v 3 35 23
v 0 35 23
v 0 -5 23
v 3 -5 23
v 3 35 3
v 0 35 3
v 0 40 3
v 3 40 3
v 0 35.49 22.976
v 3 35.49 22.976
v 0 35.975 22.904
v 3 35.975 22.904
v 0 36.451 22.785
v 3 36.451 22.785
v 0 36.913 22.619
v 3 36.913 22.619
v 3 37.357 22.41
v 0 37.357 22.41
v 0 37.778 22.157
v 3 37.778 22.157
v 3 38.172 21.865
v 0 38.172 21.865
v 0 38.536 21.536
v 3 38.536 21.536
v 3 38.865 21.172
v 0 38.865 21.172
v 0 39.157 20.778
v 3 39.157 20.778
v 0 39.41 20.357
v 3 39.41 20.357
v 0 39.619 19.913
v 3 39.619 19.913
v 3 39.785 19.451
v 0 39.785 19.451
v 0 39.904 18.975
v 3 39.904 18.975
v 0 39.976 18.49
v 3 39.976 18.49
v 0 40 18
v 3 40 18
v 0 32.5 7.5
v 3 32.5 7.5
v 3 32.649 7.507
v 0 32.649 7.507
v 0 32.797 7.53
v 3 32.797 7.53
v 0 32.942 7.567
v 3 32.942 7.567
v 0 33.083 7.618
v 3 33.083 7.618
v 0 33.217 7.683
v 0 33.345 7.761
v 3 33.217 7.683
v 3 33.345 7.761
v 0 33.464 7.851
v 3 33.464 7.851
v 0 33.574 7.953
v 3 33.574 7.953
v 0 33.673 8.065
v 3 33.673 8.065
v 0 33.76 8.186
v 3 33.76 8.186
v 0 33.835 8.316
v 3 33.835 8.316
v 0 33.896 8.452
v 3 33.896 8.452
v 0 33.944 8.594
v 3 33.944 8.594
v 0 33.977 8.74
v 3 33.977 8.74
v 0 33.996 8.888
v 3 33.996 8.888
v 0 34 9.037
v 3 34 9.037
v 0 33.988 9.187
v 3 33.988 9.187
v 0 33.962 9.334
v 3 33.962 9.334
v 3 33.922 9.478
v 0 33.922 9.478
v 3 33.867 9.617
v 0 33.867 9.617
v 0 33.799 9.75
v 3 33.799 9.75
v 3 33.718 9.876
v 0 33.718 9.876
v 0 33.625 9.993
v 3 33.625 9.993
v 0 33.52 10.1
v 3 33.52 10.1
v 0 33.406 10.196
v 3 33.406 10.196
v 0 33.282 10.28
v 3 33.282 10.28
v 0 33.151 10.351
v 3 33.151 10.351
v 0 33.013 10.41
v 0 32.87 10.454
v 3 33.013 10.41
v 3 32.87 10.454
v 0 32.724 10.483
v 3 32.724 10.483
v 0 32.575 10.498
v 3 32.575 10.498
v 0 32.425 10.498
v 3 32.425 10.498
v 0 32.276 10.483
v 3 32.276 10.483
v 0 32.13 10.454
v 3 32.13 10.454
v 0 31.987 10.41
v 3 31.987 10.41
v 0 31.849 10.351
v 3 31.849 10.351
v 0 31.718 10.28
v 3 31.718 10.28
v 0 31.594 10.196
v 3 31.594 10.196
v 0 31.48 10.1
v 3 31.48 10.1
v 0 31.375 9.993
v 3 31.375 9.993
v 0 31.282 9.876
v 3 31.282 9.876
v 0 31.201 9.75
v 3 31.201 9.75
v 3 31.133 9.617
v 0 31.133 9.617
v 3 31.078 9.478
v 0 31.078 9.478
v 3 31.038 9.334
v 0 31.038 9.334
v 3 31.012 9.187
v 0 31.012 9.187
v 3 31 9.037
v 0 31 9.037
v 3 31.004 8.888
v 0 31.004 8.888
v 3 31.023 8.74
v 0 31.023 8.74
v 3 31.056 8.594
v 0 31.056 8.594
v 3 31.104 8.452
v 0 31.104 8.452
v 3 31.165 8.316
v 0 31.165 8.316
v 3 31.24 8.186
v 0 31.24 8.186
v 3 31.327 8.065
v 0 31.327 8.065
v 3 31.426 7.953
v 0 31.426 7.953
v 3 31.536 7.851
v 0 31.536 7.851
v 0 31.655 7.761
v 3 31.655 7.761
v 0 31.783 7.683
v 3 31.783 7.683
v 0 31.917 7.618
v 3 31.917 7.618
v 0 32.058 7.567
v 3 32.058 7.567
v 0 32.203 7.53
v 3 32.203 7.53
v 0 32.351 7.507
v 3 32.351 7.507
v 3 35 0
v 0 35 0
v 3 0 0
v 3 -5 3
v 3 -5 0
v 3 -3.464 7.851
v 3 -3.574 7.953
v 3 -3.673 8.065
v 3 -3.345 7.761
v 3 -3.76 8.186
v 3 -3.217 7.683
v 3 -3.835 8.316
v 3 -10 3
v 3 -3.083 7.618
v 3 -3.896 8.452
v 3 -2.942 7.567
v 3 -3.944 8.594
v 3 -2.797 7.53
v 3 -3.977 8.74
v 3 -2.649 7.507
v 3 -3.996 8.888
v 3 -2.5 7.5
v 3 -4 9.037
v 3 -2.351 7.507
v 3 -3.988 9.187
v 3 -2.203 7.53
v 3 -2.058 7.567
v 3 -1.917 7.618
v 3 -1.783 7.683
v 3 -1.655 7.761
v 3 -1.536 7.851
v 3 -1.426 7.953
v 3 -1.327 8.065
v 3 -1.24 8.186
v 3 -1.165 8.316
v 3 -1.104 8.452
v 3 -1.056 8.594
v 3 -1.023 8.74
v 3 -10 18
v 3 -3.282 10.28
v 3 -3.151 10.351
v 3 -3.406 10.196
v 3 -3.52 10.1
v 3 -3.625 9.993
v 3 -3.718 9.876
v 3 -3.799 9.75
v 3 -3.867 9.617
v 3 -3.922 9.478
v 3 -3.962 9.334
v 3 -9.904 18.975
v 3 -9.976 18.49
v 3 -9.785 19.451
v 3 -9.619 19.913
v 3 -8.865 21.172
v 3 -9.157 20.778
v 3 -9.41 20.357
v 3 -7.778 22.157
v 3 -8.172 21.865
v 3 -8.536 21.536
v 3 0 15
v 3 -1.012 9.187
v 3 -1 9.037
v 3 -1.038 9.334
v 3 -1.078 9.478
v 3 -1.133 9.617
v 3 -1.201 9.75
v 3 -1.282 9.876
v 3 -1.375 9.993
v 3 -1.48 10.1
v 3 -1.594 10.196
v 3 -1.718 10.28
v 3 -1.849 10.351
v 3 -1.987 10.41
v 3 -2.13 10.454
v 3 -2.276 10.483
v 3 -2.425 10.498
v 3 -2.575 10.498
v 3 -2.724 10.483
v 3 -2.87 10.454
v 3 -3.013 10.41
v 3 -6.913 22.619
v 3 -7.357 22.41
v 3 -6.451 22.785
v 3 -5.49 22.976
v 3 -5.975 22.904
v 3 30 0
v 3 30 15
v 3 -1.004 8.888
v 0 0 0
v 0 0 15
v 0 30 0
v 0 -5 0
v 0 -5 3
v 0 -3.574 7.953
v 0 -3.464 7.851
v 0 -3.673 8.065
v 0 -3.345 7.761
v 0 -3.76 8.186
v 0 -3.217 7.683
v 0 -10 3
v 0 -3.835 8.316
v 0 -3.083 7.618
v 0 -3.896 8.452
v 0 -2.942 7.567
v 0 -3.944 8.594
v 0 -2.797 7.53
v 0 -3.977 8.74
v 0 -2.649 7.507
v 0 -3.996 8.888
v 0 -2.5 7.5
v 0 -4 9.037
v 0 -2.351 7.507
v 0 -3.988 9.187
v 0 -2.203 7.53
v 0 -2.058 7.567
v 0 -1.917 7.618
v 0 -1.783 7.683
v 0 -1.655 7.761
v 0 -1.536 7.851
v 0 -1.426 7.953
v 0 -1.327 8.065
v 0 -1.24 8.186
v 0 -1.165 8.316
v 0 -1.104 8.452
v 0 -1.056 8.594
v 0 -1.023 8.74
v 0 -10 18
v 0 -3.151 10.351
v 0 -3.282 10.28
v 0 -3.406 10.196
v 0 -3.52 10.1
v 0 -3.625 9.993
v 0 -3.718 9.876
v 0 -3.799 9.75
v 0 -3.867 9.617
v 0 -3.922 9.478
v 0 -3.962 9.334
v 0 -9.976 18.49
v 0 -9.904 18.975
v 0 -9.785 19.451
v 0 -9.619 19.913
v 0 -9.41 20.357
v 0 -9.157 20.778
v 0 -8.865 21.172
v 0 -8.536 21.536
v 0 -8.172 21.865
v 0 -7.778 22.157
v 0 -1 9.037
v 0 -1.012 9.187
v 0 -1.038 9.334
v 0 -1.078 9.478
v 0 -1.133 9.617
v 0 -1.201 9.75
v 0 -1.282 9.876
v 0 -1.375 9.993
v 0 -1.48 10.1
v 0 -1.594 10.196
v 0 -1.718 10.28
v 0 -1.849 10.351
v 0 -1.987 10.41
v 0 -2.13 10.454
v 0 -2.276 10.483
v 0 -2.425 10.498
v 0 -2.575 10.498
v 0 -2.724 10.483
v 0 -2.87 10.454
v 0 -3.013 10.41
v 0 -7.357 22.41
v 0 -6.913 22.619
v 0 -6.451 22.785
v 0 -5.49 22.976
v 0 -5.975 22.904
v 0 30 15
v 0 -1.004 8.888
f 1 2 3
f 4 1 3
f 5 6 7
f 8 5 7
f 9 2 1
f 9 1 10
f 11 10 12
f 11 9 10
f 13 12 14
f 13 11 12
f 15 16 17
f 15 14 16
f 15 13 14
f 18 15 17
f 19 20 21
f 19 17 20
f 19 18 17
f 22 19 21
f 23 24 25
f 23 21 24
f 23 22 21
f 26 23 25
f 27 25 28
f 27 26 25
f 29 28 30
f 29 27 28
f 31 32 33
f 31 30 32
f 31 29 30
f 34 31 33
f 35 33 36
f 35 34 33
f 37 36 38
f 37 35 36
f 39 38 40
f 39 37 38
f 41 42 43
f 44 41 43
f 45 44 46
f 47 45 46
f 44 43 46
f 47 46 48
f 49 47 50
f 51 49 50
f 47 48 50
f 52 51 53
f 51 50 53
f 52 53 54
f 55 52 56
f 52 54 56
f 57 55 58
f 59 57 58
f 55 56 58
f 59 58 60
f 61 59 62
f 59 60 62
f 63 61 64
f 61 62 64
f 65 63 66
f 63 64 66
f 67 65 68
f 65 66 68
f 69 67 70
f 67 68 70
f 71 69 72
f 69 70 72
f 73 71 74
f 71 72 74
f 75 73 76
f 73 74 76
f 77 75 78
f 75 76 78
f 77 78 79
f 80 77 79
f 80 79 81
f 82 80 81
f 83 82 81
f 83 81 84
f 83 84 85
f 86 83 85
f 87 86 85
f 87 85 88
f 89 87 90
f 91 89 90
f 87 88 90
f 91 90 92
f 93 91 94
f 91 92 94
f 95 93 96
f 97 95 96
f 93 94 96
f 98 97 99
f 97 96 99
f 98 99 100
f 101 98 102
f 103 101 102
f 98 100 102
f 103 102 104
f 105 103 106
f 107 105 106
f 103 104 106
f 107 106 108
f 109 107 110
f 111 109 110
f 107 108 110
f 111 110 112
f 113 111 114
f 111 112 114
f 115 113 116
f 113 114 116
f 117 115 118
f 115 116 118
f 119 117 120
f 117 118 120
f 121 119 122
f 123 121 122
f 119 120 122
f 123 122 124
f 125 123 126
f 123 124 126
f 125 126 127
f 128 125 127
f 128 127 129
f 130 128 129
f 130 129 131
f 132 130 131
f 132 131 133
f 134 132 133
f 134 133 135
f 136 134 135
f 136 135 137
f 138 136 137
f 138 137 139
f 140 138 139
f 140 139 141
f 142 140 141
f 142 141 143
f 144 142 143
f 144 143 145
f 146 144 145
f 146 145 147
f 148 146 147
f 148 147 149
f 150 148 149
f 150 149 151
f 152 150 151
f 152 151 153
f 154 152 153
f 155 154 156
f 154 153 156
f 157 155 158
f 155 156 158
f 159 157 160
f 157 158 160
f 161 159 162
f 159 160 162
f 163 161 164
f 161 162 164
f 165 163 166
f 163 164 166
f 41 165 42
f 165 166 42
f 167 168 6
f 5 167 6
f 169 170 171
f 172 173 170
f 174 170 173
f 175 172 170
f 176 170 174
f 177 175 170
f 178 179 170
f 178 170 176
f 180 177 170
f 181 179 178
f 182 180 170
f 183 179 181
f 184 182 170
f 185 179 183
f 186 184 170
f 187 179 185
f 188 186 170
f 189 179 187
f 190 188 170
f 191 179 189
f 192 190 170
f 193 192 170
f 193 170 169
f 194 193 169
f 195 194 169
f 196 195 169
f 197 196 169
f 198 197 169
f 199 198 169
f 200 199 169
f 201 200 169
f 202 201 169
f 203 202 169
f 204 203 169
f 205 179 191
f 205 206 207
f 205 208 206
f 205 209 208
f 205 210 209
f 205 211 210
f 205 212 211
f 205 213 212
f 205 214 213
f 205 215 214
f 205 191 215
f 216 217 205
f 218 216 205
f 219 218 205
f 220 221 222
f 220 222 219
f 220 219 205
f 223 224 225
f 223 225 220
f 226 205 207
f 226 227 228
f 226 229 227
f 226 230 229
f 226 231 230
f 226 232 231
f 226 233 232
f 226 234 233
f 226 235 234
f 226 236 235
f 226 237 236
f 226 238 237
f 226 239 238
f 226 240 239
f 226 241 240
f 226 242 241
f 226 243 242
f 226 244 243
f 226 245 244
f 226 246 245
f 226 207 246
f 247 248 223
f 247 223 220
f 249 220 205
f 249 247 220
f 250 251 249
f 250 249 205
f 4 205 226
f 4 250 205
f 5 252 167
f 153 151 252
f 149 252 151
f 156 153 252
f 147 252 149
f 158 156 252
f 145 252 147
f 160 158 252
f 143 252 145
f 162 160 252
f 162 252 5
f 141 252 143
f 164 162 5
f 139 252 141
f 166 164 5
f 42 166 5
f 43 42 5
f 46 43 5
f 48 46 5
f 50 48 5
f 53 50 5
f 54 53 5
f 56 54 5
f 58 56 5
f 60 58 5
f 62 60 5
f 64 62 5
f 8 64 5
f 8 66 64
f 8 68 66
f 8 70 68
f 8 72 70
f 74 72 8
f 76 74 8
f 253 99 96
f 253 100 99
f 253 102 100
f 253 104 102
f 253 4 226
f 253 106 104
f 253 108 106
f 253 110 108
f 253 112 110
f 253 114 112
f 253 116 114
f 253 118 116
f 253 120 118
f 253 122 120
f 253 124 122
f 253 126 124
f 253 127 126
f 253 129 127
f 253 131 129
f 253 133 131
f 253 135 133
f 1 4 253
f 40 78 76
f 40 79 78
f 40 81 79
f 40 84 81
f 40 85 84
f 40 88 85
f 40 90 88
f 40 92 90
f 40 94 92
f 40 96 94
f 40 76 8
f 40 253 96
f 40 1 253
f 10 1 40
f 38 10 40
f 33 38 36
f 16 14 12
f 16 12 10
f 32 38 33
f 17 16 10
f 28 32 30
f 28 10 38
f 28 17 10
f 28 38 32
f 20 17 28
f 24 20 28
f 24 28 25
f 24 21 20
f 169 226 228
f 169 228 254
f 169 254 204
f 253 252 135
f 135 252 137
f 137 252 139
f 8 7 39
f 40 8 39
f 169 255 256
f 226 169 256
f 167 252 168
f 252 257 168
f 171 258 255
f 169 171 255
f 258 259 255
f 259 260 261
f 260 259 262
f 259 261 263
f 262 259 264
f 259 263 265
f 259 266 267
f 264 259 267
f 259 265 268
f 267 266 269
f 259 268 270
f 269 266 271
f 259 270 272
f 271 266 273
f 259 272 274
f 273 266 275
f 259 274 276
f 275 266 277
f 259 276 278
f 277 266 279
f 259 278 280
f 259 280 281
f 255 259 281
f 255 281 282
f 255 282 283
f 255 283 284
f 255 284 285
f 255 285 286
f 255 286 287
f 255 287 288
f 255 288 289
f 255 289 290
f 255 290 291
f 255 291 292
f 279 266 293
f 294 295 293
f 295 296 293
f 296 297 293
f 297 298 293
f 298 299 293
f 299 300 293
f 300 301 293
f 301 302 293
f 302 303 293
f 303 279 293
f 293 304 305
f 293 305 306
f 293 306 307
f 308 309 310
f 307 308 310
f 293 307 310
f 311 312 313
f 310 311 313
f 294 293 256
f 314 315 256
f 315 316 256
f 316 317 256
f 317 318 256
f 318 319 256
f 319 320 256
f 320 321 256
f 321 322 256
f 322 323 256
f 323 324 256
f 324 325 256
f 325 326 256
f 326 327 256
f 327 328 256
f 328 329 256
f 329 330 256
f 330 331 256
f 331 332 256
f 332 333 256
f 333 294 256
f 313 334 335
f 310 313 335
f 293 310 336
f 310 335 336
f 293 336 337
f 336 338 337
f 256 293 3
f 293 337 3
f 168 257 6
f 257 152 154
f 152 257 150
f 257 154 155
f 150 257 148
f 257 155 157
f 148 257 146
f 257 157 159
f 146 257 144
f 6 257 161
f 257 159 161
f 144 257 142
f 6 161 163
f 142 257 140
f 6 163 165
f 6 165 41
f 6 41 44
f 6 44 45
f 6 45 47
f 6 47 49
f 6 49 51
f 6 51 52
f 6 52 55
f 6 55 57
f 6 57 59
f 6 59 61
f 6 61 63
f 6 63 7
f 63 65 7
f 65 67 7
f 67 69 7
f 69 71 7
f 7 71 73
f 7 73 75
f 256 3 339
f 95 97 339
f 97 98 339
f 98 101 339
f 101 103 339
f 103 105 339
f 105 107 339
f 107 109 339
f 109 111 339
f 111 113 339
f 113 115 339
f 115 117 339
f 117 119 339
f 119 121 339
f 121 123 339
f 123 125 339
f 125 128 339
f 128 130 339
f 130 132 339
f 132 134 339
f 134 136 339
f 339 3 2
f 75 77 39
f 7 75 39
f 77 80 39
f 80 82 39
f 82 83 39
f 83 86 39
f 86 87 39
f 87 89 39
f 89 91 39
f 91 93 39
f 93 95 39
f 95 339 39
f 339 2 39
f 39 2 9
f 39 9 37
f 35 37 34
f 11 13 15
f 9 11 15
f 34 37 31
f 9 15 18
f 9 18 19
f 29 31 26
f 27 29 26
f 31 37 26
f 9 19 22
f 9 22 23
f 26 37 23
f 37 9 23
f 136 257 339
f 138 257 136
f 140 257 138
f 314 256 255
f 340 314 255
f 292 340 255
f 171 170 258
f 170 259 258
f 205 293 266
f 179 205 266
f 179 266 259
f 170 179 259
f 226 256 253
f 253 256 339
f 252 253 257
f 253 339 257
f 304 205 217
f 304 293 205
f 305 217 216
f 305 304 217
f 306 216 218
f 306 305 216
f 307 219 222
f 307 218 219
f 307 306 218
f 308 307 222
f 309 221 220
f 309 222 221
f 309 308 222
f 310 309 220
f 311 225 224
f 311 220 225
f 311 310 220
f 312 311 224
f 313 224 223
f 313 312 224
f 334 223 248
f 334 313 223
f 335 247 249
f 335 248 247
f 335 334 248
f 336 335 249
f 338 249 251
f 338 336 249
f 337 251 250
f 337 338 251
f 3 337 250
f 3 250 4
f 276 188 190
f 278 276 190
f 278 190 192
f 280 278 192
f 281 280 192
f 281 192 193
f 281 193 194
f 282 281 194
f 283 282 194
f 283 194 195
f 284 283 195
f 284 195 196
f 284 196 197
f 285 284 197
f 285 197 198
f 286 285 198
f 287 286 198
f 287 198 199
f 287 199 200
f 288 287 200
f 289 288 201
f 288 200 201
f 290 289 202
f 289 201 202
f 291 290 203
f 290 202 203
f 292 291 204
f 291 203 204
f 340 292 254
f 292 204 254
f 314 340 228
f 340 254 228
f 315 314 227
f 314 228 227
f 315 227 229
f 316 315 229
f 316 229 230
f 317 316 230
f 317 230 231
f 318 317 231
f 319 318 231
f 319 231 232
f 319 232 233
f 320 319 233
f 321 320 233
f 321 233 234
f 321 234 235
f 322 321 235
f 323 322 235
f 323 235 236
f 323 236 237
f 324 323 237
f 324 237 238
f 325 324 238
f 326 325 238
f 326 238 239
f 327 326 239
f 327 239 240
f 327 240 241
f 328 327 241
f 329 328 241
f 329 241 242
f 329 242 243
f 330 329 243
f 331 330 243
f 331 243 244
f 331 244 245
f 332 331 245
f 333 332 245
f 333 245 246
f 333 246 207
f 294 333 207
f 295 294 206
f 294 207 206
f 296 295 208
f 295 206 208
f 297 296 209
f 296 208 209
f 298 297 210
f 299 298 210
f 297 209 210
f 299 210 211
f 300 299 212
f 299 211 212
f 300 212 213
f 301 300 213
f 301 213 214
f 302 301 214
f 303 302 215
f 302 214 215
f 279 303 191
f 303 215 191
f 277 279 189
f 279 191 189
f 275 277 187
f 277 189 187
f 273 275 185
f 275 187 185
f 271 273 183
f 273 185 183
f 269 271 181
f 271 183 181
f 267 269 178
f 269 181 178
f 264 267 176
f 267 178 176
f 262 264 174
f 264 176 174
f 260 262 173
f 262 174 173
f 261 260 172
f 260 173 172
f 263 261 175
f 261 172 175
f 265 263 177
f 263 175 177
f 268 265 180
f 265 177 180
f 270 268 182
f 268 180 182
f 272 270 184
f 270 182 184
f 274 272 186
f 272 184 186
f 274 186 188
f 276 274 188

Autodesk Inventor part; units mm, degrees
ref_plane "YZ Plane" through (0, 0, 0) normal (1, 0, 0) x (0, 1, 0)
ref_plane "XZ Plane" through (0, 0, 0) normal (0, 1, 0) x (-1, 0, 0)
ref_plane "XY Plane" through (0, 0, 0) normal (0, 0, 1) x (1, 0, 0)
sketch "Sketch1" plane through (0, 0, 0) normal (1, 0, 0) x (0, 1, 0)
  line L0 (30, 0) -> (35, 0)
  line L1 (35, 0) -> (35, 3)
  line L2 (35, 3) -> (40, 3)
  line L3 (40, 3) -> (40, 18)
  line L4 (35, 23) -> (-5, 23)
  line L5 (-10, 18) -> (-10, 3)
  line L6 (-10, 3) -> (-5, 3)
  line L7 (-5, 3) -> (-5, 0)
  line L8 (-5, 0) -> (0, 0)
  line L9 (0, 0) -> (0, 15)
  line L10 (0, 15) -> (30, 15)
  line L11 (30, 15) -> (30, 0)
  arc A0 (-5, 23) -> (-10, 18) centre (-5, 18) ccw
  arc A1 (40, 18) -> (35, 23) centre (35, 18) ccw
  point P0 (-10, 23)
  dimension "d0" = 5
  dimension "d1" = 3
  dimension "d2" = 5
  dimension "d3" = 20
  dimension "d4" = 30
  dimension "d5" = 12
  dimension "d6" = 5
  dimension "d7" = 3
  dimension "d8" = 5
  dimension "d9" = 5
extrude "Extrusion1" add sketch "Sketch1" along normal blind 3
sketch "Sketch3" plane through (3, 0, 0) normal (1, 0, 0) x (0, 0, -1)
  line L0 (0, 0) -> (-15, 0) projected
  line L1 (-15, 0) -> (-15, 30) projected
  line L2 (-15, 30) -> (0, 30) projected
  circle A0 centre (-9, 32.5) radius 1.5
  circle A1 centre (-9, -2.5) radius 1.5
  dimension "d12" = 3
  dimension "d14" = 3
  dimension "d15" = 6
  dimension "d16" = 6
  dimension "d17" = 2.5
  dimension "d18" = 2.5
extrude "Extrusion2" cut sketch "Sketch3" against normal blind 3
properties part number "Servo Mount 080113"
